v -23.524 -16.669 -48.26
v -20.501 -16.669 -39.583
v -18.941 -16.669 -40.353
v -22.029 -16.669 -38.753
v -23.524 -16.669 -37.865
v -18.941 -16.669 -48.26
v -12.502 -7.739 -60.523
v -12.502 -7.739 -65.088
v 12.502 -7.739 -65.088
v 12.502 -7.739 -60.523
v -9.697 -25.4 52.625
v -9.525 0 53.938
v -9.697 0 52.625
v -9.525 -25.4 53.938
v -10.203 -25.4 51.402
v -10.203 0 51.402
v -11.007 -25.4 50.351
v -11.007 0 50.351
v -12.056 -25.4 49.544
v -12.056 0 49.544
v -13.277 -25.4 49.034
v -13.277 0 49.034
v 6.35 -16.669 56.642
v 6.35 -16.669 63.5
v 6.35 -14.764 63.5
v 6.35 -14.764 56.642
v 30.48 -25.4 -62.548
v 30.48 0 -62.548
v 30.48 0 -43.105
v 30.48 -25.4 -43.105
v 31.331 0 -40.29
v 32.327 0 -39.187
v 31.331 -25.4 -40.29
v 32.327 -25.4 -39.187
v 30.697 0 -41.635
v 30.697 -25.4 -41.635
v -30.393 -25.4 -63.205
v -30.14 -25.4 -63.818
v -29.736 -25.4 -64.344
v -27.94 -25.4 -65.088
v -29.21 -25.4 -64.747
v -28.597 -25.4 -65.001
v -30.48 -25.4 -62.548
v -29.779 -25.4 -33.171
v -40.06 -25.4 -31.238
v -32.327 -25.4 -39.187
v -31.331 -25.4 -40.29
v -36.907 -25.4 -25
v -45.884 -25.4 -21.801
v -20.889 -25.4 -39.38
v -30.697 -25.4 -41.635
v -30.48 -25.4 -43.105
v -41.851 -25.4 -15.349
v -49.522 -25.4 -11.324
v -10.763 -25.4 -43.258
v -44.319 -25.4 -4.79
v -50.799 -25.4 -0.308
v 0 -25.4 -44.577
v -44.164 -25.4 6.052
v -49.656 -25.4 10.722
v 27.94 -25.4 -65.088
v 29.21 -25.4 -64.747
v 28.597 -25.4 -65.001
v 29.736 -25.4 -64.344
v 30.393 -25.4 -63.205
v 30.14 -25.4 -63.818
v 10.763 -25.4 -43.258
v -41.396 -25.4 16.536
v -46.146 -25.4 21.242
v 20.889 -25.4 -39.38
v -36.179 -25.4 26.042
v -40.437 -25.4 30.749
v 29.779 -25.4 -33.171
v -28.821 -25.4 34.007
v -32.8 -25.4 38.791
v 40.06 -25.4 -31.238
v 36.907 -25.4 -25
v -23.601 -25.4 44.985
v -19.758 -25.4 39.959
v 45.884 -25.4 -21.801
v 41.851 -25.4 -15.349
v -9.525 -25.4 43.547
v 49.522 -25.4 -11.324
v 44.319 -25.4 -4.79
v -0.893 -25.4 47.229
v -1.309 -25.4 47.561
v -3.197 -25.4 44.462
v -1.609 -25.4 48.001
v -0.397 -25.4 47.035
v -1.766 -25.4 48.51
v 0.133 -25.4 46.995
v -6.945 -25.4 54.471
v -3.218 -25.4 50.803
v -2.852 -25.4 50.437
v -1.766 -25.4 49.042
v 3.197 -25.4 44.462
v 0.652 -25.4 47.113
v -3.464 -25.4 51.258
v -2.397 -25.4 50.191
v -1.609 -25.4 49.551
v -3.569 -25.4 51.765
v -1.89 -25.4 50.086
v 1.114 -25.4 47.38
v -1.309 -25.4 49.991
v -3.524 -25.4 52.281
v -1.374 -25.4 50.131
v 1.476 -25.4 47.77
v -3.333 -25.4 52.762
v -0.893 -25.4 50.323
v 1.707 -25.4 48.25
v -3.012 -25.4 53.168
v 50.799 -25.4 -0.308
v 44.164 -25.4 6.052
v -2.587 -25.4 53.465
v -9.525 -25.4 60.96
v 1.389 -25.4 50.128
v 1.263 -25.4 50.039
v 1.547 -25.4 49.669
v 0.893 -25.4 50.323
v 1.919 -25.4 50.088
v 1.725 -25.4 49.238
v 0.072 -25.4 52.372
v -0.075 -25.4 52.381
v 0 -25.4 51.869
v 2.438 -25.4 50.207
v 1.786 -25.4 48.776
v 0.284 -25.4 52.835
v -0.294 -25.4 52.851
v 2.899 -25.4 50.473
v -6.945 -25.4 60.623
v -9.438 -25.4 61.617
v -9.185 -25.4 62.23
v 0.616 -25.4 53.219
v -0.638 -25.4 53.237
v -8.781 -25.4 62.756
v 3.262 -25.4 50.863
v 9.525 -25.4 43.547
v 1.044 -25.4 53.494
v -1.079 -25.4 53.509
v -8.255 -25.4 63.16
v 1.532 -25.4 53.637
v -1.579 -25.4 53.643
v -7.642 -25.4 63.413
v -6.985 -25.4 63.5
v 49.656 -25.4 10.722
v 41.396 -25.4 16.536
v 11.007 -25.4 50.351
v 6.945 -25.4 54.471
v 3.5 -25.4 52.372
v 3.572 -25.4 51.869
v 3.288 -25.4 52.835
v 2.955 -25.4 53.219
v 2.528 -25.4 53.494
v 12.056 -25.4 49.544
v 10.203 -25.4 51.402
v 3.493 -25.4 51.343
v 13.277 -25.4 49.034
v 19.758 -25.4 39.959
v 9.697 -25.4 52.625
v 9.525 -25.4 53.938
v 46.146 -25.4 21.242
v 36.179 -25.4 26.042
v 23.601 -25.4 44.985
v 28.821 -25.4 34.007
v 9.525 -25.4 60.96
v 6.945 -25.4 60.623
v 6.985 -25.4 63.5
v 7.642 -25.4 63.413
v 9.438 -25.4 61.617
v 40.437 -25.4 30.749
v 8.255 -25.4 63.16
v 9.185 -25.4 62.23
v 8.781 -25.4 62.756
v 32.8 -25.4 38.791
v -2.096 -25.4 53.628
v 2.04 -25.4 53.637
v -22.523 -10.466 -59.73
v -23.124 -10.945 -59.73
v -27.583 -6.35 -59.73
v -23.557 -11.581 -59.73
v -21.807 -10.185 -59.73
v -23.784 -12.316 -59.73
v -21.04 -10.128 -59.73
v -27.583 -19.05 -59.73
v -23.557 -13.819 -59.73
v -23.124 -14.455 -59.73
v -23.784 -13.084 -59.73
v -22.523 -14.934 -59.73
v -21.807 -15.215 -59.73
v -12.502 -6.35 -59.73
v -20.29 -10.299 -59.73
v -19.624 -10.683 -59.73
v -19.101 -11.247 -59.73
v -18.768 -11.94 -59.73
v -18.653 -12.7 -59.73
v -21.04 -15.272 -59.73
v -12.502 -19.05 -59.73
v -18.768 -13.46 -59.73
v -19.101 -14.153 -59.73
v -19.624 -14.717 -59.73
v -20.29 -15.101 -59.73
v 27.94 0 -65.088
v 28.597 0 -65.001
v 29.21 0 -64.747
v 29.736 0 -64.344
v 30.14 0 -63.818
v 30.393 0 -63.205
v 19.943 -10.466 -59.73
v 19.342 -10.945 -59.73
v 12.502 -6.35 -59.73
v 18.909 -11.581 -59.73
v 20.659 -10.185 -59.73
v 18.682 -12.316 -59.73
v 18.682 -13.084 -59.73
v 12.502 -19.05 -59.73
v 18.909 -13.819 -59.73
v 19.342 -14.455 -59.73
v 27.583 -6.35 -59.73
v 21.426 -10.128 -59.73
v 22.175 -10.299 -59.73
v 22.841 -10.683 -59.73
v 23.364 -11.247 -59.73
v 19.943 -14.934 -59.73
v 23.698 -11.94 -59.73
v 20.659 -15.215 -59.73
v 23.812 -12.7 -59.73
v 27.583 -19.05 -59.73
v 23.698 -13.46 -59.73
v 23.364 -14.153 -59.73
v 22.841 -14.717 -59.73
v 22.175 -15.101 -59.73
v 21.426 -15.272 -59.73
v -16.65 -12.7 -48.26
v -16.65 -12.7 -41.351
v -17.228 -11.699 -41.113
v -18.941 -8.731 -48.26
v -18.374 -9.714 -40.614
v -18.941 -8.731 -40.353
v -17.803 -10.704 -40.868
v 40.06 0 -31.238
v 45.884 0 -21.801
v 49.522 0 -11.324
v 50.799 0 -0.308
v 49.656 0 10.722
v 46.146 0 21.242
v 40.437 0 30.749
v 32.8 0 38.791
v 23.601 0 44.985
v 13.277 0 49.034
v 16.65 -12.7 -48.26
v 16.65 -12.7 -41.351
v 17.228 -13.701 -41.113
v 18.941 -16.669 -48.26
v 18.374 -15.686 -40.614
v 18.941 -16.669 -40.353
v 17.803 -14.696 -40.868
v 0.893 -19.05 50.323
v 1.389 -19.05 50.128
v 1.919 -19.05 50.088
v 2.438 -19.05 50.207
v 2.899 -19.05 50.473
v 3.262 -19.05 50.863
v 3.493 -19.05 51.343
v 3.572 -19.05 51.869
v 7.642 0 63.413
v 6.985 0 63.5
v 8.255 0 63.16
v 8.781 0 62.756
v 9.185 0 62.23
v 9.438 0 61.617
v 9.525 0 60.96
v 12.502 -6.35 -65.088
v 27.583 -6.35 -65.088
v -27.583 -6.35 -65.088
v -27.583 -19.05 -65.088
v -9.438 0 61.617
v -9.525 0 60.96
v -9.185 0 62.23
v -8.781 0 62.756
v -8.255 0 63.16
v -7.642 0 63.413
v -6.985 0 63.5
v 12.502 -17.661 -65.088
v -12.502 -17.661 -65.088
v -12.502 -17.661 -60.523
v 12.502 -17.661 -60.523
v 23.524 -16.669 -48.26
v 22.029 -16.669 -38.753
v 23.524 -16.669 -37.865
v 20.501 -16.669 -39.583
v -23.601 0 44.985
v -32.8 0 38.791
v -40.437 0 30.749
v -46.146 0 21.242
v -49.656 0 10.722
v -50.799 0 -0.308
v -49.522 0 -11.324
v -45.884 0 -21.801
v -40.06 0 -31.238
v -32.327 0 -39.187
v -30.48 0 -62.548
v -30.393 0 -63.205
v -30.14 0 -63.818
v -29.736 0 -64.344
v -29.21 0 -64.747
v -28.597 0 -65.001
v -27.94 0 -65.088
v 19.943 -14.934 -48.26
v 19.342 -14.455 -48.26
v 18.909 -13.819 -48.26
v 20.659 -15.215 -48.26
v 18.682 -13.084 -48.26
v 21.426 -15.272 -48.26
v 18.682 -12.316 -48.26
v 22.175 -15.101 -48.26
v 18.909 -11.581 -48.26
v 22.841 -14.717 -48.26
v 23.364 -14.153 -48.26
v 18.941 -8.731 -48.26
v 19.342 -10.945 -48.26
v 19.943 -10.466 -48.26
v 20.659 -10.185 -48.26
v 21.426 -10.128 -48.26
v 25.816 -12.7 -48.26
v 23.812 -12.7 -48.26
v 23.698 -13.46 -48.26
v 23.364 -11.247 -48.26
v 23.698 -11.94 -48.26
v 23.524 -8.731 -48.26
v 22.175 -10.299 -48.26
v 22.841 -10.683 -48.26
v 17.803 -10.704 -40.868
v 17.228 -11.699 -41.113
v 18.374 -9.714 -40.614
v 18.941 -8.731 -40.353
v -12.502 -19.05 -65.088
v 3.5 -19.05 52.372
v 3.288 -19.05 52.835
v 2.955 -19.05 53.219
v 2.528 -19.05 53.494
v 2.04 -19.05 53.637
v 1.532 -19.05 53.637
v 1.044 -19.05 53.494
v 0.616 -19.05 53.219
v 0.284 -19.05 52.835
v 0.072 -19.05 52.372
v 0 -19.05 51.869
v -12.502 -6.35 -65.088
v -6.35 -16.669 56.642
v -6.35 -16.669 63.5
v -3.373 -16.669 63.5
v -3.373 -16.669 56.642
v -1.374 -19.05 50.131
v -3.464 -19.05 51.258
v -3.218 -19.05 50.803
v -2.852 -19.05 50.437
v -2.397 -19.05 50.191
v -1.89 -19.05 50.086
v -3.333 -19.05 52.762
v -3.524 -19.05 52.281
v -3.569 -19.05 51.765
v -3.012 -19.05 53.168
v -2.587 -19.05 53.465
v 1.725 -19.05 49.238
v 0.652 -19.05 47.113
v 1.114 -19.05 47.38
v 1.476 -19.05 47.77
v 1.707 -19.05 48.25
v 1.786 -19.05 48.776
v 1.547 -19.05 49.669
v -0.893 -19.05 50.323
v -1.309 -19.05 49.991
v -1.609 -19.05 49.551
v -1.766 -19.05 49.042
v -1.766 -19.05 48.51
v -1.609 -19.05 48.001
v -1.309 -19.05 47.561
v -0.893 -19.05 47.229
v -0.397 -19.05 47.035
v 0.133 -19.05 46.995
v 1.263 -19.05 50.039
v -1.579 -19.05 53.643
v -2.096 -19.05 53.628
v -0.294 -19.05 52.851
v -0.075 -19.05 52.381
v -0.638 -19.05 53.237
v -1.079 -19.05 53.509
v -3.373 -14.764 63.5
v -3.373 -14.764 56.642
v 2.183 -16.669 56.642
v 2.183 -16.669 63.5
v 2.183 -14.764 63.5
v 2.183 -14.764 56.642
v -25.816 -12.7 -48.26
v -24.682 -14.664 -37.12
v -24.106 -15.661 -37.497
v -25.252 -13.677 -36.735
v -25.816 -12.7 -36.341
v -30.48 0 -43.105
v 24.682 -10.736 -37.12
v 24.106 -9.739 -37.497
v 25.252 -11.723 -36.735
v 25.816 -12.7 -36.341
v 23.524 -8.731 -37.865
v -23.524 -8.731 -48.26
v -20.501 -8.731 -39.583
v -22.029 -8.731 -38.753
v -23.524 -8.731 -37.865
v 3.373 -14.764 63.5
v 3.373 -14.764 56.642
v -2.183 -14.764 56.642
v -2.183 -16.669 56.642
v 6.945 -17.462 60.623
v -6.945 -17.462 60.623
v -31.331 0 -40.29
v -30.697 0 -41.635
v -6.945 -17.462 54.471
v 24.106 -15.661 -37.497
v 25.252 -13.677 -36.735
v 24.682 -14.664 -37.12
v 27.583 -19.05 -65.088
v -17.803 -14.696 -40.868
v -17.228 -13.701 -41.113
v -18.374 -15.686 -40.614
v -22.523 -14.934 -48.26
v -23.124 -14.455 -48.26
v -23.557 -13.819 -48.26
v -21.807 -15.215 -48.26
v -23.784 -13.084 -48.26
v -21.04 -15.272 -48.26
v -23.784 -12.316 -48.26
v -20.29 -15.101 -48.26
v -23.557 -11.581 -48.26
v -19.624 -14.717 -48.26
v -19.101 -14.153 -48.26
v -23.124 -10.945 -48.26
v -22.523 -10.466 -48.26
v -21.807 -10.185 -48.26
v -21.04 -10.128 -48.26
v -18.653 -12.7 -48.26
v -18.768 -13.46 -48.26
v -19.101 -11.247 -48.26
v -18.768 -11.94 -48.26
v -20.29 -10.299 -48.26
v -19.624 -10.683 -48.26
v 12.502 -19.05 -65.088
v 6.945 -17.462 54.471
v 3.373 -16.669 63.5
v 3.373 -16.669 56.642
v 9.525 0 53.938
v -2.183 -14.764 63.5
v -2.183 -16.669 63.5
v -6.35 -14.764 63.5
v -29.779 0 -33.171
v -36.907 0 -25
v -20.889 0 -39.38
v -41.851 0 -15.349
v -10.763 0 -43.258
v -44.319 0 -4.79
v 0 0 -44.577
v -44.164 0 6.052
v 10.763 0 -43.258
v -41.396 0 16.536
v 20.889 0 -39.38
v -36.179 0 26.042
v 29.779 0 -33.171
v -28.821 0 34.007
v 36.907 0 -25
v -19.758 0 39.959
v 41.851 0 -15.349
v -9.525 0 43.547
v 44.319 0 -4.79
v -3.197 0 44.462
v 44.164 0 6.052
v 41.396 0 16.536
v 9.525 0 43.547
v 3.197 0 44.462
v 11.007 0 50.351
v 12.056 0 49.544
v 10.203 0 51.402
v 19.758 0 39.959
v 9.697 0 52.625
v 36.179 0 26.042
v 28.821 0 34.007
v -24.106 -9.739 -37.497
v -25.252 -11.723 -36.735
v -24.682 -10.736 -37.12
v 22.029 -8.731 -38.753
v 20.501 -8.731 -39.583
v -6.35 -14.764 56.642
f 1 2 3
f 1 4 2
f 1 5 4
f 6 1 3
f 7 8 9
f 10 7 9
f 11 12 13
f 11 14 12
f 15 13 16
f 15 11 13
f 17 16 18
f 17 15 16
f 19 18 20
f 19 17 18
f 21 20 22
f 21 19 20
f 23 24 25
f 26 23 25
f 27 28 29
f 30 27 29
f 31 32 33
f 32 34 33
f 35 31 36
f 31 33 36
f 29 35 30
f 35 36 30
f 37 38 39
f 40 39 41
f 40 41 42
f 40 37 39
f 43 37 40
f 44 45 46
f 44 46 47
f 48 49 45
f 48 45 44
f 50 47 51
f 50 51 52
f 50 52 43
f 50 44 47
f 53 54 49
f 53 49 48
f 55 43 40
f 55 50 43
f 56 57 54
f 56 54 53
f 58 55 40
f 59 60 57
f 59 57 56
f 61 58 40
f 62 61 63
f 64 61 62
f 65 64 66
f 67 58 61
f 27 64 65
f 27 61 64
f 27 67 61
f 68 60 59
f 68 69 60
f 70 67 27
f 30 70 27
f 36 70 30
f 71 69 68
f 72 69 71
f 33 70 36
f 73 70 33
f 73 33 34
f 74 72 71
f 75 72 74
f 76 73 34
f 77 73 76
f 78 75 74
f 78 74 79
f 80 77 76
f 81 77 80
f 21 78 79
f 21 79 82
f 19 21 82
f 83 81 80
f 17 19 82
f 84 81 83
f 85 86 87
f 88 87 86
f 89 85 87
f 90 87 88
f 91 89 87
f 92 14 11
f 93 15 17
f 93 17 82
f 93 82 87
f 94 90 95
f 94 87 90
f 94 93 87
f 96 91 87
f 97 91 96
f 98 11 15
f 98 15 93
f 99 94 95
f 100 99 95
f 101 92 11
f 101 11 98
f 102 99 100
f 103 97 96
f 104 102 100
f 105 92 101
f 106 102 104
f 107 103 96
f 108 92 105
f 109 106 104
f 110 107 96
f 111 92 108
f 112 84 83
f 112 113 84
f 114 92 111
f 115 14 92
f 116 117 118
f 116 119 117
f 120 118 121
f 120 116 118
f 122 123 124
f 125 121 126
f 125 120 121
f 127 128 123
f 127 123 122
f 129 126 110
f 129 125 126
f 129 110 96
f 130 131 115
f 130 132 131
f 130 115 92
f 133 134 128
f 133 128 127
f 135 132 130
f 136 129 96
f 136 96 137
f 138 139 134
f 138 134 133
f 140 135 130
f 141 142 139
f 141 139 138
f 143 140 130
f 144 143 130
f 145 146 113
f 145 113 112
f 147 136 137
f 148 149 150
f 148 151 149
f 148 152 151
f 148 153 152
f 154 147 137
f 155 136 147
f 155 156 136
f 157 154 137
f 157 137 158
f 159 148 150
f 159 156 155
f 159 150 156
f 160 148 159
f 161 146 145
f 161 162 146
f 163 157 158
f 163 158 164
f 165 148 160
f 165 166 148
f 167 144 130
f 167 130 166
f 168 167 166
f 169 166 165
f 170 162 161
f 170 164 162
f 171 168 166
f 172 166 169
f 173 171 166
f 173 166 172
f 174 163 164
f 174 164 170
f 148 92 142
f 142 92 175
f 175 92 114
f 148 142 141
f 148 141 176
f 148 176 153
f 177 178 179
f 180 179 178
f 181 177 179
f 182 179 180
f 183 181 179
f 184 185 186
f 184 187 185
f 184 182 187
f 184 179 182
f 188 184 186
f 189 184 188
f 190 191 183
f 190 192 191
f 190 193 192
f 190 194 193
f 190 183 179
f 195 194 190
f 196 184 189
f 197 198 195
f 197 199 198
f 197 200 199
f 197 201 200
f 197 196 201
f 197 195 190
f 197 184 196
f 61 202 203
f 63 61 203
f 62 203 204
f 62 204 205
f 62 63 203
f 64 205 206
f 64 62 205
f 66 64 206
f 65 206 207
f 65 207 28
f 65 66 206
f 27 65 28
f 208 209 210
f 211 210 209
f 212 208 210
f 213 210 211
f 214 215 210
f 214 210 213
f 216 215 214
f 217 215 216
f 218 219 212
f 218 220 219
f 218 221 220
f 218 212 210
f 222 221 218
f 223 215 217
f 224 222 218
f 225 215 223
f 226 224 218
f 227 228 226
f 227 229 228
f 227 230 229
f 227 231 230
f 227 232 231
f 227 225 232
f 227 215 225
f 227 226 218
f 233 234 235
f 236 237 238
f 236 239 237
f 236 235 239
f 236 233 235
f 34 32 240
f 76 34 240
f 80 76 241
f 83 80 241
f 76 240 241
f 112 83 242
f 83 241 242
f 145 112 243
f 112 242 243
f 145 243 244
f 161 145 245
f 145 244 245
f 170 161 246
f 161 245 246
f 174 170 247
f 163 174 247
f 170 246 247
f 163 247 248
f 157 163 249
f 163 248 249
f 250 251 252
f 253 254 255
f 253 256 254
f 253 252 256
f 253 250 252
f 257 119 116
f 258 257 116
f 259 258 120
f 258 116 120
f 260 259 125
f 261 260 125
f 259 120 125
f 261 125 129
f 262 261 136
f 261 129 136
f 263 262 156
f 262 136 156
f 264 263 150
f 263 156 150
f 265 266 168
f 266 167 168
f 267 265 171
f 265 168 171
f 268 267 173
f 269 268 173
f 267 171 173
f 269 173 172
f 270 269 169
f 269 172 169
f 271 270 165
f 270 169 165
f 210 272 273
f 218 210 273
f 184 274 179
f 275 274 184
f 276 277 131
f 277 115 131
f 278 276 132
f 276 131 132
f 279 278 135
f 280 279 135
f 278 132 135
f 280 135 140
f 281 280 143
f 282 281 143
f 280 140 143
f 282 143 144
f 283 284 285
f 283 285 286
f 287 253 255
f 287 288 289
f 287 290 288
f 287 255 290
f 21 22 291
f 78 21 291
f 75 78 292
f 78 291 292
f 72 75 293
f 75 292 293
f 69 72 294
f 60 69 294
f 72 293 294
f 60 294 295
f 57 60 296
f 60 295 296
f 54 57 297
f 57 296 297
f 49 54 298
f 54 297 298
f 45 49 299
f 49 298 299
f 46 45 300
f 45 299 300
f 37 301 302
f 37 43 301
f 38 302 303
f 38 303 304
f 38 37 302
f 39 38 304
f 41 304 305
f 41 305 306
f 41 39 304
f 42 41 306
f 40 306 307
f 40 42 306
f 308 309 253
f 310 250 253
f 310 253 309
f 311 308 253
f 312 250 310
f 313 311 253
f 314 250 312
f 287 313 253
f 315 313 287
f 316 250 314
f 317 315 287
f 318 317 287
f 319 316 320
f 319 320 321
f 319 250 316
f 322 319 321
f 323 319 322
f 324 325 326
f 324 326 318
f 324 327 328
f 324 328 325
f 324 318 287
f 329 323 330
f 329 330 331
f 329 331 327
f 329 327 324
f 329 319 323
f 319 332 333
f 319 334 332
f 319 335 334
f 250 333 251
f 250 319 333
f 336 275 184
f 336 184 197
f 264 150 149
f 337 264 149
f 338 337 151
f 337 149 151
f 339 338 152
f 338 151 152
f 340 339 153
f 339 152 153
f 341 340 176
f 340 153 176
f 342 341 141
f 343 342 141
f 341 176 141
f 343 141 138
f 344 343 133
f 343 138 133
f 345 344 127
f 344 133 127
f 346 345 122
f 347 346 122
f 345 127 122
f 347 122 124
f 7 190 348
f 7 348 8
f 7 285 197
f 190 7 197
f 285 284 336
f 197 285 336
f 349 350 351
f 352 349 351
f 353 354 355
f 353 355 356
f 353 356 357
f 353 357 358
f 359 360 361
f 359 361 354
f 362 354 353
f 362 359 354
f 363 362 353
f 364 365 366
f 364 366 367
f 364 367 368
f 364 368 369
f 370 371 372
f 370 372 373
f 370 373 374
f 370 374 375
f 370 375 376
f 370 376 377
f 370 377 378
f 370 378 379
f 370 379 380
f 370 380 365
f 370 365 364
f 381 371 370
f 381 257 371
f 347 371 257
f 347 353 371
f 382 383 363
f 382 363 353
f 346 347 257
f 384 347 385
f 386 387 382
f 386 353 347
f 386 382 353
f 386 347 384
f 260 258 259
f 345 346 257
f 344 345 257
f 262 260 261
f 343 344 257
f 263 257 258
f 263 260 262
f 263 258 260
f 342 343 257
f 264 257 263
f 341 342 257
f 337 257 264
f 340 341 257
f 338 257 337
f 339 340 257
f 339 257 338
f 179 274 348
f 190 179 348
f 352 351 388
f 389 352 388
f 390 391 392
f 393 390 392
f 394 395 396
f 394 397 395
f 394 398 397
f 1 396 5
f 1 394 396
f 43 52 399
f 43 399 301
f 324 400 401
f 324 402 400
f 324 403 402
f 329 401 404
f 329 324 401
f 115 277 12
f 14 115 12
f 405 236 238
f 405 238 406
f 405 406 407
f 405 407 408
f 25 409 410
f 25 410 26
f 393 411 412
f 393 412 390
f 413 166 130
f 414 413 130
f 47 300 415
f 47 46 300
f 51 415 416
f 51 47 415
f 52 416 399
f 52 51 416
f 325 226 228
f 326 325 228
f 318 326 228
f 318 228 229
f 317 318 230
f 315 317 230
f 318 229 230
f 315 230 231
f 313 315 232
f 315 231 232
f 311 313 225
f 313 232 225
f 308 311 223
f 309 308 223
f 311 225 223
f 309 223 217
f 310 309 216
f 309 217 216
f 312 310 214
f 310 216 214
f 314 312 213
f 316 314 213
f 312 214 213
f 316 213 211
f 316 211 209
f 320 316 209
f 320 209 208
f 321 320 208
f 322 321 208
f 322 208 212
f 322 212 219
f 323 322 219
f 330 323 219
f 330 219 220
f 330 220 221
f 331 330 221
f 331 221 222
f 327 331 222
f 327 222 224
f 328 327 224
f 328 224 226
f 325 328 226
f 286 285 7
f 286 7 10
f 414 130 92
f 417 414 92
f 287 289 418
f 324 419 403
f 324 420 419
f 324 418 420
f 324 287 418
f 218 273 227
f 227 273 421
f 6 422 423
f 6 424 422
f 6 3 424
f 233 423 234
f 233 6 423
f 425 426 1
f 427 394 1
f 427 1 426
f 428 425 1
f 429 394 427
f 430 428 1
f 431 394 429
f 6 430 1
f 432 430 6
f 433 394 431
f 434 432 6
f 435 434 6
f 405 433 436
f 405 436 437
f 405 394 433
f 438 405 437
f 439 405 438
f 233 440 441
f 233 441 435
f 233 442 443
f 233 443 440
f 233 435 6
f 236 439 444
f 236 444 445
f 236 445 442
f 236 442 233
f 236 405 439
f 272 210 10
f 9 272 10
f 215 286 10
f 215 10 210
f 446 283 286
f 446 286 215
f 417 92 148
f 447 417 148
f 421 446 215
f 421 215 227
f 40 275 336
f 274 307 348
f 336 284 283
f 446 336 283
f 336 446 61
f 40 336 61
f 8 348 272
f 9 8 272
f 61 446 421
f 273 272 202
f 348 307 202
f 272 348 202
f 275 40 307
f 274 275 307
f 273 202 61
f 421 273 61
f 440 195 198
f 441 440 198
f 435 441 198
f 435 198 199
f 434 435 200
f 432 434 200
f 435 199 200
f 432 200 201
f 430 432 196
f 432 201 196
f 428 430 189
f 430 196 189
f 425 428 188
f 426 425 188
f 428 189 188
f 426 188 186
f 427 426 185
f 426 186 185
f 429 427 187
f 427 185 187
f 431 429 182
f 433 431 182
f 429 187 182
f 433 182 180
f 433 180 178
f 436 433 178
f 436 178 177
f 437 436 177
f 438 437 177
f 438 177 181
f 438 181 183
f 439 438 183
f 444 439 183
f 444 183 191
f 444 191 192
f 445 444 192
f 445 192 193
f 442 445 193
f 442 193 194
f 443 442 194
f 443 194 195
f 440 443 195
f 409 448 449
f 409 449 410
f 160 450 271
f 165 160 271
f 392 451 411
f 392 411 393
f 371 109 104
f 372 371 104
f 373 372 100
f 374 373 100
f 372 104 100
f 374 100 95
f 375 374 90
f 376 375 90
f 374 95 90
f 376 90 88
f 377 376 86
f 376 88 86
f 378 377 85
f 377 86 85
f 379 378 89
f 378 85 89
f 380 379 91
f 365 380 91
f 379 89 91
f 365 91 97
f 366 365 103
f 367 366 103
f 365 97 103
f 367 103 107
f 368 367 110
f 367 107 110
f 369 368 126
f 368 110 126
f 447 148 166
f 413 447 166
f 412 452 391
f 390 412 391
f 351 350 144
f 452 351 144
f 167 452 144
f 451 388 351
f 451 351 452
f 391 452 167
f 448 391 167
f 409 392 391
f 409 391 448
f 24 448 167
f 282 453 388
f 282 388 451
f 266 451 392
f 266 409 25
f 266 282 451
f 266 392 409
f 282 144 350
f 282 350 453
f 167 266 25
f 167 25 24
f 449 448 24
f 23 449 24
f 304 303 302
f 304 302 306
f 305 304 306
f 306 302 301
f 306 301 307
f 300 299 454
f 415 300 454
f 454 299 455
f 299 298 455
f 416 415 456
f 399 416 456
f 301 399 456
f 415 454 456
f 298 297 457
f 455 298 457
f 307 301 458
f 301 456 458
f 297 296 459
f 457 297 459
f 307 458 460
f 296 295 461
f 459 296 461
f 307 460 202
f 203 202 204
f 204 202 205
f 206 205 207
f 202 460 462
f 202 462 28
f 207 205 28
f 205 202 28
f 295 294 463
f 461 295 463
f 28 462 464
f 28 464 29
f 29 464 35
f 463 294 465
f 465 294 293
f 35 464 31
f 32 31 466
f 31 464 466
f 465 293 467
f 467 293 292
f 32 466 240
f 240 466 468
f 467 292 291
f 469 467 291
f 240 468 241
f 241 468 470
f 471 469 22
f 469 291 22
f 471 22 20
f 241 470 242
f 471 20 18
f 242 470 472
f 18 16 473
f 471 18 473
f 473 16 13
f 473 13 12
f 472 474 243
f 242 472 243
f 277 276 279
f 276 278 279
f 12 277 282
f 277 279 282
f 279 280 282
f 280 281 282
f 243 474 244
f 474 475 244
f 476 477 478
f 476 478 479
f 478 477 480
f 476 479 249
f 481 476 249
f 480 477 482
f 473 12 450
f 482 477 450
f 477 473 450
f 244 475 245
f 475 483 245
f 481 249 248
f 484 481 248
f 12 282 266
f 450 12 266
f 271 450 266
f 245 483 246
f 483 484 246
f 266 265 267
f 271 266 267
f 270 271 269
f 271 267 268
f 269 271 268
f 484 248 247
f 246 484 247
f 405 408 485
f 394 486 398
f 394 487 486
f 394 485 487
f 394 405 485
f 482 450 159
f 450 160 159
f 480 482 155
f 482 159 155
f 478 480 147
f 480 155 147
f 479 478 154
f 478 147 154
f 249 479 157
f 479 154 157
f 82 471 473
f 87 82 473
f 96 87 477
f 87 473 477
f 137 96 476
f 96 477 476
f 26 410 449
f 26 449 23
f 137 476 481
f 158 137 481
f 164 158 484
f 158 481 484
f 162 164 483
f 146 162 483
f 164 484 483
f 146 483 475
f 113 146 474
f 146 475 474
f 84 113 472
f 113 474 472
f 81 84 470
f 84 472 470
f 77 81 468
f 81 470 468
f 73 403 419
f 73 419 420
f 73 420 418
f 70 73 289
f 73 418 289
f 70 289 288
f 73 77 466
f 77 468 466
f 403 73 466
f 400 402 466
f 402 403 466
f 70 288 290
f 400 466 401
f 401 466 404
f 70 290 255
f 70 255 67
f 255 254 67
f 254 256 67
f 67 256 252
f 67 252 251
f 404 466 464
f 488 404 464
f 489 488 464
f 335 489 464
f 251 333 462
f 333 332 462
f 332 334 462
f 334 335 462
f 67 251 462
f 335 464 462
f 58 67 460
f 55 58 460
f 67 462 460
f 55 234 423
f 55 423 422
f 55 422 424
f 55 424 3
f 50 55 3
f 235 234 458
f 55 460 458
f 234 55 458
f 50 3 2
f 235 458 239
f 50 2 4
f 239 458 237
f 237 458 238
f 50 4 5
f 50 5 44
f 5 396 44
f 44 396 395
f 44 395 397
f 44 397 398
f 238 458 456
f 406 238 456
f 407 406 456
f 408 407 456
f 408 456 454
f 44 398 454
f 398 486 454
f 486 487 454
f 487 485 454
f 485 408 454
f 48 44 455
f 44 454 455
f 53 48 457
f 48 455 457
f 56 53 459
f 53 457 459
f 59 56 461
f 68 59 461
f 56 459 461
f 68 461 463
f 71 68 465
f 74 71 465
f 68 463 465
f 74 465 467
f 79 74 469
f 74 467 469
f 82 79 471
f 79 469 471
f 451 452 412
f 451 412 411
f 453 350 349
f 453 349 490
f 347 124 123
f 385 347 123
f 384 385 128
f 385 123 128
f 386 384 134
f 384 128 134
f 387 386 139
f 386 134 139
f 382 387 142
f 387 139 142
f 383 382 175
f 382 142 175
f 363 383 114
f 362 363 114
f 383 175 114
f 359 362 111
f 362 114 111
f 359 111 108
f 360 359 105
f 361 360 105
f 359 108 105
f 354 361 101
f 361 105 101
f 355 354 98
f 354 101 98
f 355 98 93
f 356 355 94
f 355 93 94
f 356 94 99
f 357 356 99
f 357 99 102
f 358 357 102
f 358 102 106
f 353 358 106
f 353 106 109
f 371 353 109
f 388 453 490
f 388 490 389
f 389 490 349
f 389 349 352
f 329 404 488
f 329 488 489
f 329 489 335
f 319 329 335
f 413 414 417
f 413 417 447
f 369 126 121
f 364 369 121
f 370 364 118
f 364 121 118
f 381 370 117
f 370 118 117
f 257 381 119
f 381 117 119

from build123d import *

# Parameters (mm, degrees)
F1_DEPTH  = 25.4
F3_DEPTH  = 6.35
F5_DEPTH  = 7.9375
F6_W      = 12.7
F6_H      = 1.905
F7_DEPTH  = 6.858
F8_W      = 1.190625
F8_H      = 1.905
F9_DEPTH  = 12.7
F11_DEPTH = 25.4
F12_W     = 15.08125
F12_H     = 12.7
F13_DEPTH = 5.3578125
F14_R     = 2.5796875
F15_DEPTH = 25.4
F18_DEPTH = 25.4
F19_W     = 25.003125
F19_H     = 9.921875
F20_DEPTH = 4.5640625
F21_R     = 2.54
F22_R     = 2.54
F23_R     = 5.08


with BuildPart() as f1:
    # F0 (on Front) → F1 (new body)
    with BuildSketch(Plane.XZ):
        with BuildLine():
            ThreePointArc((9.525, 43.5474833257), (34.7253859158, 27.9509660298), (44.577, 0))
            ThreePointArc((44.577, 0), (-27.9509660298, -34.7253859158), (-9.525, 43.5474833257))
            Line((-9.525, 43.5474833257), (-9.525, 49.8990418245))
            ThreePointArc((-9.525, 49.8990418245), (-32.3787739113, -39.1440289189), (50.8, 0))
            ThreePointArc((50.8, 0), (39.1440289189, 32.3787739113), (9.525, 49.8990418245))
            Line((9.525, 49.8990418245), (9.525, 43.5474833257))
        make_face()
        with BuildLine():
            ThreePointArc((-9.525, 43.5474833257), (0, 44.577), (9.525, 43.5474833257))
            Line((9.525, 43.5474833257), (9.525, 49.8990418245))
            ThreePointArc((9.525, 49.8990418245), (0, 50.8), (-9.525, 49.8990418245))
            Line((-9.525, 49.8990418245), (-9.525, 43.5474833257))
        make_face()
        with BuildLine():
            ThreePointArc((-9.525, 49.8990418245), (0, 50.8), (9.525, 49.8990418245))
            Line((9.525, 49.8990418245), (9.525, 63.5))
            Line((9.525, 63.5), (-9.525, 63.5))
            Line((-9.525, 63.5), (-9.525, 49.8990418245))
        make_face()
    extrude(amount=F1_DEPTH)

    # F2 (on face) → F3 (cut)
    with BuildSketch(Plane.XZ.offset(25.4)):
        with BuildLine():
            ThreePointArc((0.8929687032, 50.3226047716), (2.6789062266, 50.322604731), (3.571875, 51.8692719891))
            ThreePointArc((3.571875, 51.8692719891), (1.7859375, 53.6552094891), (0, 51.8692719891))
            ThreePointArc((0, 51.8692719891), (0.2392702419, 50.9763032626), (0.8929687032, 50.3226047716))
        make_face()
        with BuildLine():
            ThreePointArc((-0.8929687383, 50.3226047513), (-0.2392702521, 50.976303245), (0, 51.8692719891))
            ThreePointArc((0, 51.8692719891), (-3.3326047479, 52.7622407333), (-0.8929687383, 50.3226047513))
        make_face()
        with BuildLine():
            ThreePointArc((0.8929687032, 50.3226047716), (0.2392702419, 50.9763032626), (0, 51.8692719891))
            ThreePointArc((0, 51.8692719891), (-0.2392702521, 50.976303245), (-0.8929687383, 50.3226047513))
            ThreePointArc((-0.8929687383, 50.3226047513), (-2.03e-08, 50.561875), (0.8929687032, 50.3226047716))
        make_face()
        with BuildLine():
            ThreePointArc((1.7859375, 48.7759375), (1.546667231, 49.6689062734), (0.8929687032, 50.3226047716))
            ThreePointArc((0.8929687032, 50.3226047716), (-2.03e-08, 50.561875), (-0.8929687383, 50.3226047513))
            ThreePointArc((-0.8929687383, 50.3226047513), (-0.8929687558, 47.2292702588), (1.7859375, 48.7759375))
        make_face()
    extrude(amount=-F3_DEPTH, mode=Mode.SUBTRACT)

    # F4 (on face) → F5 (cut)
    with BuildSketch(Plane.XZ.offset(25.4)):
        Polygon((-6.9453125, 60.6226043245), (-6.9453125, 54.4710418245), (6.9453125, 54.4710418245), (6.9453125, 60.6226043245), align=None)
    extrude(amount=-F5_DEPTH, mode=Mode.SUBTRACT)

    # F6 (on face) → F7 (cut)
    with BuildSketch(Plane.XY.offset(63.5)):
        with Locations((0, -15.71625)):
            Rectangle(F6_W, F6_H)
    extrude(amount=-F7_DEPTH, mode=Mode.SUBTRACT)

    # F8 (on face) → F9 (join)
    with BuildSketch(Plane.XY.offset(63.5)):
        with Locations((2.778125, -15.71625)):
            Rectangle(F8_W, F8_H)
        with Locations((-2.778125, -15.71625)):
            Rectangle(F8_W, F8_H)
    extrude(amount=-F9_DEPTH)

    # F10 (on Front) → F11 (join)
    with BuildSketch(Plane.XZ):
        with BuildLine():
            Line((-30.48, -65.0875), (30.48, -65.0875))
            Line((30.48, -65.0875), (30.48, -40.64))
            ThreePointArc((30.48, -40.64), (0, -50.8), (-30.48, -40.64))
            Line((-30.48, -40.64), (-30.48, -65.0875))
        make_face()
    extrude(amount=F11_DEPTH)

    # F12 (on face) → F13 (cut)
    with BuildSketch(Plane(origin=(0, 0, -65.0875), x_dir=(1, 0, 0), z_dir=(0, 0, -1))):
        with Locations((20.0421875, 12.7)):
            Rectangle(F12_W, F12_H)
        with Locations((-20.0421875, 12.7)):
            Rectangle(F12_W, F12_H)
    extrude(amount=-F13_DEPTH, mode=Mode.SUBTRACT)

    # F14 (on face) → F15 (cut)
    with BuildSketch(Plane(origin=(0, 0, -59.7296875), x_dir=(1, 0, 0), z_dir=(0, 0, -1))):
        with Locations((21.2328125, 12.7)):
            Circle(F14_R)
        with Locations((-21.2328125, 12.7)):
            Circle(F14_R)
    extrude(amount=-F15_DEPTH, mode=Mode.SUBTRACT)

    # F17 (on offset) → F18 (cut)
    with BuildSketch(Plane.XY.offset(-48.26)):
        Polygon((18.9414536192, -16.66875), (23.5241713808, -16.66875), (25.8155302617, -12.7), (23.5241713808, -8.73125), (18.9414536192, -8.73125), (16.6500947383, -12.7), align=None)
        Polygon((-25.8155302617, -12.7), (-23.5241713808, -16.66875), (-18.9414536192, -16.66875), (-16.6500947383, -12.7), (-18.9414536192, -8.73125), (-23.5241713808, -8.73125), align=None)
    extrude(amount=F18_DEPTH, mode=Mode.SUBTRACT)

    # F19 (on face) → F20 (cut)
    with BuildSketch(Plane(origin=(0, 0, -65.0875), x_dir=(1, 0, 0), z_dir=(0, 0, -1))):
        with Locations((0, 12.7)):
            Rectangle(F19_W, F19_H)
    extrude(amount=-F20_DEPTH, mode=Mode.SUBTRACT)

    # F21
    f21_edges = [f1.edges().sort_by_distance(p)[0] for p in [
        (-30.48, -12.7, -65.0875),
        (30.48, -12.7, -65.0875),
    ]]
    fillet(f21_edges, radius=F21_R)

    # F22
    f22_edges = [f1.edges().sort_by_distance(p)[0] for p in [
        (-9.525, -12.7, 63.5),
        (9.525, -12.7, 63.5),
    ]]
    fillet(f22_edges, radius=F22_R)

    # F23
    f23_edges = [f1.edges().sort_by_distance(p)[0] for p in [
        (9.525, -12.7, 49.899042),
        (-9.525, -12.7, 49.899042),
        (30.48, -12.7, -40.64),
        (-30.48, -12.7, -40.64),
    ]]
    fillet(f23_edges, radius=F23_R)


solid = f1.part
